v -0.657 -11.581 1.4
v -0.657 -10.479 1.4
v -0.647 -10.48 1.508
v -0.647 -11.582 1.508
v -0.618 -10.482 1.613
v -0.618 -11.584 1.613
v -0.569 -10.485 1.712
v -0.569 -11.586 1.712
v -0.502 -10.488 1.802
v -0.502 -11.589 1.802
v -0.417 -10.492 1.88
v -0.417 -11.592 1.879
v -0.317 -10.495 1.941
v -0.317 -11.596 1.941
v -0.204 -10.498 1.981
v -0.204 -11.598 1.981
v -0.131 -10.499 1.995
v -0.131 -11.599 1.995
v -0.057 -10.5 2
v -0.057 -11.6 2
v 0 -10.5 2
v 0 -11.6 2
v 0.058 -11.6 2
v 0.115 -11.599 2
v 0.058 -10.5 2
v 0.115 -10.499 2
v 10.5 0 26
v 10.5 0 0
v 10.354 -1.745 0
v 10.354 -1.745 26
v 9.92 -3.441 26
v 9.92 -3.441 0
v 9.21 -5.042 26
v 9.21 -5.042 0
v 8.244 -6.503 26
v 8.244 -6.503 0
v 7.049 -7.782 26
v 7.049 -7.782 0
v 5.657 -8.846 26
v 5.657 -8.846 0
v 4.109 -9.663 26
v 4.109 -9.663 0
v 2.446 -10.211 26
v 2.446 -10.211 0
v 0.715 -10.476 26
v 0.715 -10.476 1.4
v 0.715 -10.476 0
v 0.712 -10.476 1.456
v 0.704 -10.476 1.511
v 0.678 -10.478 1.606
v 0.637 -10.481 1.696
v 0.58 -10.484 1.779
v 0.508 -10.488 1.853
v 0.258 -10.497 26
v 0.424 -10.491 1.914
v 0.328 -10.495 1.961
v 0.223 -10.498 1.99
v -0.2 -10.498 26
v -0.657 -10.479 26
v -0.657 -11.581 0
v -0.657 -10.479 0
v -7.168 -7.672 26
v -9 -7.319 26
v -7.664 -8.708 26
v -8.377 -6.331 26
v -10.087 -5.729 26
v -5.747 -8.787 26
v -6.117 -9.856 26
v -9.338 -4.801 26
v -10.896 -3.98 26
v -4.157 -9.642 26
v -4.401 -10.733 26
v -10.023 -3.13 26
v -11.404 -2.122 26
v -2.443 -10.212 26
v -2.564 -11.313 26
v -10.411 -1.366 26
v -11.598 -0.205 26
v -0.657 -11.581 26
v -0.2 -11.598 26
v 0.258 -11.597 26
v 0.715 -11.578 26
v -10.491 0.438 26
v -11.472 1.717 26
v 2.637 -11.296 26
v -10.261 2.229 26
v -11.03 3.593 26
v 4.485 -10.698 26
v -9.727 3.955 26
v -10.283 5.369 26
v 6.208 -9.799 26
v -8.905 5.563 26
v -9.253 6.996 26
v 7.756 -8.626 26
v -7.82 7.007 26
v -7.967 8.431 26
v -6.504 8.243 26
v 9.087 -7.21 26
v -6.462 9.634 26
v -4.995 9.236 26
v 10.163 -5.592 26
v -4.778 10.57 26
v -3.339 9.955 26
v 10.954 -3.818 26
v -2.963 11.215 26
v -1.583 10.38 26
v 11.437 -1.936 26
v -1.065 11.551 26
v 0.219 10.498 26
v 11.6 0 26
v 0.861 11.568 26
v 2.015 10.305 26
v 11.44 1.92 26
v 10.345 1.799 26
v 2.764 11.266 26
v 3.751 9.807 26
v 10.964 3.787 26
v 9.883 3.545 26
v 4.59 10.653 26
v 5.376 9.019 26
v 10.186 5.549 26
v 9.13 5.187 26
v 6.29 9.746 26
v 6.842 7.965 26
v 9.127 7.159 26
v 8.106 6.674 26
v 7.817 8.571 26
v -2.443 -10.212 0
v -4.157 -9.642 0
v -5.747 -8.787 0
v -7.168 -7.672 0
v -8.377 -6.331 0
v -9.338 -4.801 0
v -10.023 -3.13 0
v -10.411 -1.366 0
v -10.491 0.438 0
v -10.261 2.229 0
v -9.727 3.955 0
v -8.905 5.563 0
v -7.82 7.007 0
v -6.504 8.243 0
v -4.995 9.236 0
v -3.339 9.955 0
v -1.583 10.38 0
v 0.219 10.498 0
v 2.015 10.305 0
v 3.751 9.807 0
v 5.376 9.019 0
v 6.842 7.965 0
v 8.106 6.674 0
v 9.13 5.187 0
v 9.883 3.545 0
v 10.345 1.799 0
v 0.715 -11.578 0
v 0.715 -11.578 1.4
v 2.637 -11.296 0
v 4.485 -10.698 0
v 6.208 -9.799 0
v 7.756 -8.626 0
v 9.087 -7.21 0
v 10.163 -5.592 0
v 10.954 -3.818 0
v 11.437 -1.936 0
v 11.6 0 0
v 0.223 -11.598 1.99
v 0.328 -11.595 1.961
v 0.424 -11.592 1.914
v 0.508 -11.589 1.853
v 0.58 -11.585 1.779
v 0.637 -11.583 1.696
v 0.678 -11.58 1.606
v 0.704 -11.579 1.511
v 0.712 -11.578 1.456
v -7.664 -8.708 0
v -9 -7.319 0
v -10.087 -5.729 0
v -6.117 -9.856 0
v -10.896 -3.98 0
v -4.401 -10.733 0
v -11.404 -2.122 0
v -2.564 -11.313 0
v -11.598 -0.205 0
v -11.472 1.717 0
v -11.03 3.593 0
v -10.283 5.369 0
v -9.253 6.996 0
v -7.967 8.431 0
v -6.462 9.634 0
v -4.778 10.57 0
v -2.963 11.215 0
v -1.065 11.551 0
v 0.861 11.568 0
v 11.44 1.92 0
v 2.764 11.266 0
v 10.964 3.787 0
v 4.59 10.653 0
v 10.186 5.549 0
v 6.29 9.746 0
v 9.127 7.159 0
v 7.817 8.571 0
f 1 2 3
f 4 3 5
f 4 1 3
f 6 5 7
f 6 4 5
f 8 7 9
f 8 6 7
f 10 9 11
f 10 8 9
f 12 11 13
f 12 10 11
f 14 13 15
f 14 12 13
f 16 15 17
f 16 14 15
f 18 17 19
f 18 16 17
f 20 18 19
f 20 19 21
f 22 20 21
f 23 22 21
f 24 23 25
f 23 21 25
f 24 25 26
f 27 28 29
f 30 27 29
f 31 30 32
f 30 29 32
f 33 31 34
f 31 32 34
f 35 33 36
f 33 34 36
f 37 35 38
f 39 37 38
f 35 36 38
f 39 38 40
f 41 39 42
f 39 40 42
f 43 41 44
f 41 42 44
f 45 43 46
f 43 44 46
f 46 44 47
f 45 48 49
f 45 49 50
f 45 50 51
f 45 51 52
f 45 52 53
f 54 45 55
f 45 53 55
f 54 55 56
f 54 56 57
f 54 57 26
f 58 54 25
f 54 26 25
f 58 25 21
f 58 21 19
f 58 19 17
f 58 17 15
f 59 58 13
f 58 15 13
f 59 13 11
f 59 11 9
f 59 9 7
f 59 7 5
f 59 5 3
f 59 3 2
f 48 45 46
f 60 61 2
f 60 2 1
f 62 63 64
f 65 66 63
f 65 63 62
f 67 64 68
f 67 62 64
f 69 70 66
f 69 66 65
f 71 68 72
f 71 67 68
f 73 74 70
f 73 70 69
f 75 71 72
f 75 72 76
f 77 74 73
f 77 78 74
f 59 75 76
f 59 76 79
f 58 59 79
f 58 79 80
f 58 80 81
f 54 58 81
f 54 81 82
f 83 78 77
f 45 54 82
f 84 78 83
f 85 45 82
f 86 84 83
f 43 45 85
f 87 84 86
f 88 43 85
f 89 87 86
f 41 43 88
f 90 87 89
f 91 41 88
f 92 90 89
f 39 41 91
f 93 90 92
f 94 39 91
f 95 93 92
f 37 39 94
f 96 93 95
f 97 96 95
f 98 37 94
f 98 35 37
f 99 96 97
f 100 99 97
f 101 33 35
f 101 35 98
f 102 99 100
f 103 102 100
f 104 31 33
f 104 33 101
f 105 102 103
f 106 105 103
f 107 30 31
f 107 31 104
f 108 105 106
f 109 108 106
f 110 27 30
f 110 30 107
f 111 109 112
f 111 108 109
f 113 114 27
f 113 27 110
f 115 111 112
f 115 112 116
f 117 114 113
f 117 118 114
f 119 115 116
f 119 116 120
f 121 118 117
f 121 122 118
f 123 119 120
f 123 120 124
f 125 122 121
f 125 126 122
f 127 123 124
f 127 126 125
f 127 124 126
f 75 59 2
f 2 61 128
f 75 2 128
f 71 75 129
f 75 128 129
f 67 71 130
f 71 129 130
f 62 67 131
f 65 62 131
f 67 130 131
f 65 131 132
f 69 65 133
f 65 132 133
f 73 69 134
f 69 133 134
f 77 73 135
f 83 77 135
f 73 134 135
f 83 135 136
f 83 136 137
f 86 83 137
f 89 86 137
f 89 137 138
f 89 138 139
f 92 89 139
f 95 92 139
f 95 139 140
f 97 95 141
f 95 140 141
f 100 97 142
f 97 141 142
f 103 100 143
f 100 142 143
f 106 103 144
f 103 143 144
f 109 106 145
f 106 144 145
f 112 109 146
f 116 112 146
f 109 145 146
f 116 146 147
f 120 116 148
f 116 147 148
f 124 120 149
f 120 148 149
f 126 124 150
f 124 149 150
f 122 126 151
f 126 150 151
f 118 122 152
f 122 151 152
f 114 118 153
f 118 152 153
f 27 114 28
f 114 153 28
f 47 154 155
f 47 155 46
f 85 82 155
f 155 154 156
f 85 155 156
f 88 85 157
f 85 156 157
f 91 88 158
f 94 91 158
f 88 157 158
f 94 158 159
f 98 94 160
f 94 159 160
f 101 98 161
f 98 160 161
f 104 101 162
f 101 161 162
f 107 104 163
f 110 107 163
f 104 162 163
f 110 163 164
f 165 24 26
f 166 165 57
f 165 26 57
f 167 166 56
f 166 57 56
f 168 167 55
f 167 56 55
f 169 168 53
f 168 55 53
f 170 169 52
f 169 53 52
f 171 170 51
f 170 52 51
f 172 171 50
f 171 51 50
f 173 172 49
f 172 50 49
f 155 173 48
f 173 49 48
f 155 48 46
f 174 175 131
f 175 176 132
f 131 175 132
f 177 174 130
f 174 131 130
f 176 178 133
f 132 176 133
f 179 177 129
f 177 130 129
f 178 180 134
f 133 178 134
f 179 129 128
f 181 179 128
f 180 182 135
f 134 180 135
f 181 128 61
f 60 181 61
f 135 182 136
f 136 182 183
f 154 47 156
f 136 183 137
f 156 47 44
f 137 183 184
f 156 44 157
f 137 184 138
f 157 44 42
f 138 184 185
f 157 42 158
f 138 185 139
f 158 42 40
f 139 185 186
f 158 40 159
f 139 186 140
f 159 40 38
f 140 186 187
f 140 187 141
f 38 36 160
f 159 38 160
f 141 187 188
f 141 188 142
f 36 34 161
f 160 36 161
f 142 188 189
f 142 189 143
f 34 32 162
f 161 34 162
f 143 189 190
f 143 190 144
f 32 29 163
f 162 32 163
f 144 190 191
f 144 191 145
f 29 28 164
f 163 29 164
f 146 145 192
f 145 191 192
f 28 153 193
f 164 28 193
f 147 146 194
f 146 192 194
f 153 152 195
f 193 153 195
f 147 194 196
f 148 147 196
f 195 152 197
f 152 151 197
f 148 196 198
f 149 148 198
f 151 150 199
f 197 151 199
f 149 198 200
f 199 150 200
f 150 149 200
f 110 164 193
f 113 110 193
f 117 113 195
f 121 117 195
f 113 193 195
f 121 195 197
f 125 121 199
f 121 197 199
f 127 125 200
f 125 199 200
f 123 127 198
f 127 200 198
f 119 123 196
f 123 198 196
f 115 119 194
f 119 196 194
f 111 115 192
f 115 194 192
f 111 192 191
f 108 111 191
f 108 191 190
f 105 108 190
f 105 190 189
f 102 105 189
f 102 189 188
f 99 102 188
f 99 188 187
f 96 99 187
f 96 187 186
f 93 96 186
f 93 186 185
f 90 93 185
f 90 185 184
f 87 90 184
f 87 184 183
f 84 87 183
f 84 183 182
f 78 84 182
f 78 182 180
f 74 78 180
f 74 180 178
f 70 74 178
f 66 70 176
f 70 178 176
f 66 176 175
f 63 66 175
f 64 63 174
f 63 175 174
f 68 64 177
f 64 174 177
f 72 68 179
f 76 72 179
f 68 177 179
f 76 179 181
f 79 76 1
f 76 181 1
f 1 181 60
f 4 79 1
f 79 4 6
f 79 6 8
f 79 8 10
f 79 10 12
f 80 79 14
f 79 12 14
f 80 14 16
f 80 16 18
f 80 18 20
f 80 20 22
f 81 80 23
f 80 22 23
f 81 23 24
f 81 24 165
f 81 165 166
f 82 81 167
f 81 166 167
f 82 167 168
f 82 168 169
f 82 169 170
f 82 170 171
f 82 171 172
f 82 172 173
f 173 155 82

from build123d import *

# Parameters (mm, degrees)
F1_DEPTH = 26
F2_DEPTH = 2
F3_R     = 0.6


with BuildPart() as f1:
    # F0 (on Top) → F1 (new body)
    with BuildSketch(Plane.XY):
        with BuildLine():
            ThreePointArc((-0.6565888179, -10.479450898), (-7.1887348474, 7.6532405747), (10.5, 0))
            ThreePointArc((10.5, 0), (7.6730926803, -7.1675413302), (0.7145431009, -10.4756588412))
            Line((0.7145431009, -10.4756588412), (0.7145431009, -11.5779716772))
            ThreePointArc((0.7145431009, -11.5779716772), (8.4512927996, -7.9457944861), (11.6, 0))
            ThreePointArc((11.6, 0), (-7.966918153, 8.431382754), (-0.6565888179, -11.5814028133))
            Line((-0.6565888179, -11.5814028133), (-0.6565888179, -10.479450898))
        make_face()
        with BuildLine():
            ThreePointArc((0.7145431009, -10.4756588412), (0.0290391056, -10.4999598442), (-0.6565888179, -10.479450898))
            Line((-0.6565888179, -10.479450898), (-0.6565888179, -11.5814028133))
            ThreePointArc((-0.6565888179, -11.5814028133), (0.0290278815, -11.5999636802), (0.7145431009, -11.5779716772))
            Line((0.7145431009, -11.5779716772), (0.7145431009, -10.4756588412))
        make_face()
    extrude(amount=F1_DEPTH)

    # F0 (on Top) → F2 (cut)
    with BuildSketch(Plane.XY):
        with BuildLine():
            ThreePointArc((0.7145431009, -10.4756588412), (0.0290391056, -10.4999598442), (-0.6565888179, -10.479450898))
            Line((-0.6565888179, -10.479450898), (-0.6565888179, -11.5814028133))
            ThreePointArc((-0.6565888179, -11.5814028133), (0.0290278815, -11.5999636802), (0.7145431009, -11.5779716772))
            Line((0.7145431009, -11.5779716772), (0.7145431009, -10.4756588412))
        make_face()
    extrude(amount=F2_DEPTH, mode=Mode.SUBTRACT)

    # F3
    f3_edges = [f1.edges().sort_by_distance(p)[0] for p in [
        (0.714543, -11.026815, 2),
        (-0.656589, -11.030427, 2),
    ]]
    fillet(f3_edges, radius=F3_R)


solid = f1.part
